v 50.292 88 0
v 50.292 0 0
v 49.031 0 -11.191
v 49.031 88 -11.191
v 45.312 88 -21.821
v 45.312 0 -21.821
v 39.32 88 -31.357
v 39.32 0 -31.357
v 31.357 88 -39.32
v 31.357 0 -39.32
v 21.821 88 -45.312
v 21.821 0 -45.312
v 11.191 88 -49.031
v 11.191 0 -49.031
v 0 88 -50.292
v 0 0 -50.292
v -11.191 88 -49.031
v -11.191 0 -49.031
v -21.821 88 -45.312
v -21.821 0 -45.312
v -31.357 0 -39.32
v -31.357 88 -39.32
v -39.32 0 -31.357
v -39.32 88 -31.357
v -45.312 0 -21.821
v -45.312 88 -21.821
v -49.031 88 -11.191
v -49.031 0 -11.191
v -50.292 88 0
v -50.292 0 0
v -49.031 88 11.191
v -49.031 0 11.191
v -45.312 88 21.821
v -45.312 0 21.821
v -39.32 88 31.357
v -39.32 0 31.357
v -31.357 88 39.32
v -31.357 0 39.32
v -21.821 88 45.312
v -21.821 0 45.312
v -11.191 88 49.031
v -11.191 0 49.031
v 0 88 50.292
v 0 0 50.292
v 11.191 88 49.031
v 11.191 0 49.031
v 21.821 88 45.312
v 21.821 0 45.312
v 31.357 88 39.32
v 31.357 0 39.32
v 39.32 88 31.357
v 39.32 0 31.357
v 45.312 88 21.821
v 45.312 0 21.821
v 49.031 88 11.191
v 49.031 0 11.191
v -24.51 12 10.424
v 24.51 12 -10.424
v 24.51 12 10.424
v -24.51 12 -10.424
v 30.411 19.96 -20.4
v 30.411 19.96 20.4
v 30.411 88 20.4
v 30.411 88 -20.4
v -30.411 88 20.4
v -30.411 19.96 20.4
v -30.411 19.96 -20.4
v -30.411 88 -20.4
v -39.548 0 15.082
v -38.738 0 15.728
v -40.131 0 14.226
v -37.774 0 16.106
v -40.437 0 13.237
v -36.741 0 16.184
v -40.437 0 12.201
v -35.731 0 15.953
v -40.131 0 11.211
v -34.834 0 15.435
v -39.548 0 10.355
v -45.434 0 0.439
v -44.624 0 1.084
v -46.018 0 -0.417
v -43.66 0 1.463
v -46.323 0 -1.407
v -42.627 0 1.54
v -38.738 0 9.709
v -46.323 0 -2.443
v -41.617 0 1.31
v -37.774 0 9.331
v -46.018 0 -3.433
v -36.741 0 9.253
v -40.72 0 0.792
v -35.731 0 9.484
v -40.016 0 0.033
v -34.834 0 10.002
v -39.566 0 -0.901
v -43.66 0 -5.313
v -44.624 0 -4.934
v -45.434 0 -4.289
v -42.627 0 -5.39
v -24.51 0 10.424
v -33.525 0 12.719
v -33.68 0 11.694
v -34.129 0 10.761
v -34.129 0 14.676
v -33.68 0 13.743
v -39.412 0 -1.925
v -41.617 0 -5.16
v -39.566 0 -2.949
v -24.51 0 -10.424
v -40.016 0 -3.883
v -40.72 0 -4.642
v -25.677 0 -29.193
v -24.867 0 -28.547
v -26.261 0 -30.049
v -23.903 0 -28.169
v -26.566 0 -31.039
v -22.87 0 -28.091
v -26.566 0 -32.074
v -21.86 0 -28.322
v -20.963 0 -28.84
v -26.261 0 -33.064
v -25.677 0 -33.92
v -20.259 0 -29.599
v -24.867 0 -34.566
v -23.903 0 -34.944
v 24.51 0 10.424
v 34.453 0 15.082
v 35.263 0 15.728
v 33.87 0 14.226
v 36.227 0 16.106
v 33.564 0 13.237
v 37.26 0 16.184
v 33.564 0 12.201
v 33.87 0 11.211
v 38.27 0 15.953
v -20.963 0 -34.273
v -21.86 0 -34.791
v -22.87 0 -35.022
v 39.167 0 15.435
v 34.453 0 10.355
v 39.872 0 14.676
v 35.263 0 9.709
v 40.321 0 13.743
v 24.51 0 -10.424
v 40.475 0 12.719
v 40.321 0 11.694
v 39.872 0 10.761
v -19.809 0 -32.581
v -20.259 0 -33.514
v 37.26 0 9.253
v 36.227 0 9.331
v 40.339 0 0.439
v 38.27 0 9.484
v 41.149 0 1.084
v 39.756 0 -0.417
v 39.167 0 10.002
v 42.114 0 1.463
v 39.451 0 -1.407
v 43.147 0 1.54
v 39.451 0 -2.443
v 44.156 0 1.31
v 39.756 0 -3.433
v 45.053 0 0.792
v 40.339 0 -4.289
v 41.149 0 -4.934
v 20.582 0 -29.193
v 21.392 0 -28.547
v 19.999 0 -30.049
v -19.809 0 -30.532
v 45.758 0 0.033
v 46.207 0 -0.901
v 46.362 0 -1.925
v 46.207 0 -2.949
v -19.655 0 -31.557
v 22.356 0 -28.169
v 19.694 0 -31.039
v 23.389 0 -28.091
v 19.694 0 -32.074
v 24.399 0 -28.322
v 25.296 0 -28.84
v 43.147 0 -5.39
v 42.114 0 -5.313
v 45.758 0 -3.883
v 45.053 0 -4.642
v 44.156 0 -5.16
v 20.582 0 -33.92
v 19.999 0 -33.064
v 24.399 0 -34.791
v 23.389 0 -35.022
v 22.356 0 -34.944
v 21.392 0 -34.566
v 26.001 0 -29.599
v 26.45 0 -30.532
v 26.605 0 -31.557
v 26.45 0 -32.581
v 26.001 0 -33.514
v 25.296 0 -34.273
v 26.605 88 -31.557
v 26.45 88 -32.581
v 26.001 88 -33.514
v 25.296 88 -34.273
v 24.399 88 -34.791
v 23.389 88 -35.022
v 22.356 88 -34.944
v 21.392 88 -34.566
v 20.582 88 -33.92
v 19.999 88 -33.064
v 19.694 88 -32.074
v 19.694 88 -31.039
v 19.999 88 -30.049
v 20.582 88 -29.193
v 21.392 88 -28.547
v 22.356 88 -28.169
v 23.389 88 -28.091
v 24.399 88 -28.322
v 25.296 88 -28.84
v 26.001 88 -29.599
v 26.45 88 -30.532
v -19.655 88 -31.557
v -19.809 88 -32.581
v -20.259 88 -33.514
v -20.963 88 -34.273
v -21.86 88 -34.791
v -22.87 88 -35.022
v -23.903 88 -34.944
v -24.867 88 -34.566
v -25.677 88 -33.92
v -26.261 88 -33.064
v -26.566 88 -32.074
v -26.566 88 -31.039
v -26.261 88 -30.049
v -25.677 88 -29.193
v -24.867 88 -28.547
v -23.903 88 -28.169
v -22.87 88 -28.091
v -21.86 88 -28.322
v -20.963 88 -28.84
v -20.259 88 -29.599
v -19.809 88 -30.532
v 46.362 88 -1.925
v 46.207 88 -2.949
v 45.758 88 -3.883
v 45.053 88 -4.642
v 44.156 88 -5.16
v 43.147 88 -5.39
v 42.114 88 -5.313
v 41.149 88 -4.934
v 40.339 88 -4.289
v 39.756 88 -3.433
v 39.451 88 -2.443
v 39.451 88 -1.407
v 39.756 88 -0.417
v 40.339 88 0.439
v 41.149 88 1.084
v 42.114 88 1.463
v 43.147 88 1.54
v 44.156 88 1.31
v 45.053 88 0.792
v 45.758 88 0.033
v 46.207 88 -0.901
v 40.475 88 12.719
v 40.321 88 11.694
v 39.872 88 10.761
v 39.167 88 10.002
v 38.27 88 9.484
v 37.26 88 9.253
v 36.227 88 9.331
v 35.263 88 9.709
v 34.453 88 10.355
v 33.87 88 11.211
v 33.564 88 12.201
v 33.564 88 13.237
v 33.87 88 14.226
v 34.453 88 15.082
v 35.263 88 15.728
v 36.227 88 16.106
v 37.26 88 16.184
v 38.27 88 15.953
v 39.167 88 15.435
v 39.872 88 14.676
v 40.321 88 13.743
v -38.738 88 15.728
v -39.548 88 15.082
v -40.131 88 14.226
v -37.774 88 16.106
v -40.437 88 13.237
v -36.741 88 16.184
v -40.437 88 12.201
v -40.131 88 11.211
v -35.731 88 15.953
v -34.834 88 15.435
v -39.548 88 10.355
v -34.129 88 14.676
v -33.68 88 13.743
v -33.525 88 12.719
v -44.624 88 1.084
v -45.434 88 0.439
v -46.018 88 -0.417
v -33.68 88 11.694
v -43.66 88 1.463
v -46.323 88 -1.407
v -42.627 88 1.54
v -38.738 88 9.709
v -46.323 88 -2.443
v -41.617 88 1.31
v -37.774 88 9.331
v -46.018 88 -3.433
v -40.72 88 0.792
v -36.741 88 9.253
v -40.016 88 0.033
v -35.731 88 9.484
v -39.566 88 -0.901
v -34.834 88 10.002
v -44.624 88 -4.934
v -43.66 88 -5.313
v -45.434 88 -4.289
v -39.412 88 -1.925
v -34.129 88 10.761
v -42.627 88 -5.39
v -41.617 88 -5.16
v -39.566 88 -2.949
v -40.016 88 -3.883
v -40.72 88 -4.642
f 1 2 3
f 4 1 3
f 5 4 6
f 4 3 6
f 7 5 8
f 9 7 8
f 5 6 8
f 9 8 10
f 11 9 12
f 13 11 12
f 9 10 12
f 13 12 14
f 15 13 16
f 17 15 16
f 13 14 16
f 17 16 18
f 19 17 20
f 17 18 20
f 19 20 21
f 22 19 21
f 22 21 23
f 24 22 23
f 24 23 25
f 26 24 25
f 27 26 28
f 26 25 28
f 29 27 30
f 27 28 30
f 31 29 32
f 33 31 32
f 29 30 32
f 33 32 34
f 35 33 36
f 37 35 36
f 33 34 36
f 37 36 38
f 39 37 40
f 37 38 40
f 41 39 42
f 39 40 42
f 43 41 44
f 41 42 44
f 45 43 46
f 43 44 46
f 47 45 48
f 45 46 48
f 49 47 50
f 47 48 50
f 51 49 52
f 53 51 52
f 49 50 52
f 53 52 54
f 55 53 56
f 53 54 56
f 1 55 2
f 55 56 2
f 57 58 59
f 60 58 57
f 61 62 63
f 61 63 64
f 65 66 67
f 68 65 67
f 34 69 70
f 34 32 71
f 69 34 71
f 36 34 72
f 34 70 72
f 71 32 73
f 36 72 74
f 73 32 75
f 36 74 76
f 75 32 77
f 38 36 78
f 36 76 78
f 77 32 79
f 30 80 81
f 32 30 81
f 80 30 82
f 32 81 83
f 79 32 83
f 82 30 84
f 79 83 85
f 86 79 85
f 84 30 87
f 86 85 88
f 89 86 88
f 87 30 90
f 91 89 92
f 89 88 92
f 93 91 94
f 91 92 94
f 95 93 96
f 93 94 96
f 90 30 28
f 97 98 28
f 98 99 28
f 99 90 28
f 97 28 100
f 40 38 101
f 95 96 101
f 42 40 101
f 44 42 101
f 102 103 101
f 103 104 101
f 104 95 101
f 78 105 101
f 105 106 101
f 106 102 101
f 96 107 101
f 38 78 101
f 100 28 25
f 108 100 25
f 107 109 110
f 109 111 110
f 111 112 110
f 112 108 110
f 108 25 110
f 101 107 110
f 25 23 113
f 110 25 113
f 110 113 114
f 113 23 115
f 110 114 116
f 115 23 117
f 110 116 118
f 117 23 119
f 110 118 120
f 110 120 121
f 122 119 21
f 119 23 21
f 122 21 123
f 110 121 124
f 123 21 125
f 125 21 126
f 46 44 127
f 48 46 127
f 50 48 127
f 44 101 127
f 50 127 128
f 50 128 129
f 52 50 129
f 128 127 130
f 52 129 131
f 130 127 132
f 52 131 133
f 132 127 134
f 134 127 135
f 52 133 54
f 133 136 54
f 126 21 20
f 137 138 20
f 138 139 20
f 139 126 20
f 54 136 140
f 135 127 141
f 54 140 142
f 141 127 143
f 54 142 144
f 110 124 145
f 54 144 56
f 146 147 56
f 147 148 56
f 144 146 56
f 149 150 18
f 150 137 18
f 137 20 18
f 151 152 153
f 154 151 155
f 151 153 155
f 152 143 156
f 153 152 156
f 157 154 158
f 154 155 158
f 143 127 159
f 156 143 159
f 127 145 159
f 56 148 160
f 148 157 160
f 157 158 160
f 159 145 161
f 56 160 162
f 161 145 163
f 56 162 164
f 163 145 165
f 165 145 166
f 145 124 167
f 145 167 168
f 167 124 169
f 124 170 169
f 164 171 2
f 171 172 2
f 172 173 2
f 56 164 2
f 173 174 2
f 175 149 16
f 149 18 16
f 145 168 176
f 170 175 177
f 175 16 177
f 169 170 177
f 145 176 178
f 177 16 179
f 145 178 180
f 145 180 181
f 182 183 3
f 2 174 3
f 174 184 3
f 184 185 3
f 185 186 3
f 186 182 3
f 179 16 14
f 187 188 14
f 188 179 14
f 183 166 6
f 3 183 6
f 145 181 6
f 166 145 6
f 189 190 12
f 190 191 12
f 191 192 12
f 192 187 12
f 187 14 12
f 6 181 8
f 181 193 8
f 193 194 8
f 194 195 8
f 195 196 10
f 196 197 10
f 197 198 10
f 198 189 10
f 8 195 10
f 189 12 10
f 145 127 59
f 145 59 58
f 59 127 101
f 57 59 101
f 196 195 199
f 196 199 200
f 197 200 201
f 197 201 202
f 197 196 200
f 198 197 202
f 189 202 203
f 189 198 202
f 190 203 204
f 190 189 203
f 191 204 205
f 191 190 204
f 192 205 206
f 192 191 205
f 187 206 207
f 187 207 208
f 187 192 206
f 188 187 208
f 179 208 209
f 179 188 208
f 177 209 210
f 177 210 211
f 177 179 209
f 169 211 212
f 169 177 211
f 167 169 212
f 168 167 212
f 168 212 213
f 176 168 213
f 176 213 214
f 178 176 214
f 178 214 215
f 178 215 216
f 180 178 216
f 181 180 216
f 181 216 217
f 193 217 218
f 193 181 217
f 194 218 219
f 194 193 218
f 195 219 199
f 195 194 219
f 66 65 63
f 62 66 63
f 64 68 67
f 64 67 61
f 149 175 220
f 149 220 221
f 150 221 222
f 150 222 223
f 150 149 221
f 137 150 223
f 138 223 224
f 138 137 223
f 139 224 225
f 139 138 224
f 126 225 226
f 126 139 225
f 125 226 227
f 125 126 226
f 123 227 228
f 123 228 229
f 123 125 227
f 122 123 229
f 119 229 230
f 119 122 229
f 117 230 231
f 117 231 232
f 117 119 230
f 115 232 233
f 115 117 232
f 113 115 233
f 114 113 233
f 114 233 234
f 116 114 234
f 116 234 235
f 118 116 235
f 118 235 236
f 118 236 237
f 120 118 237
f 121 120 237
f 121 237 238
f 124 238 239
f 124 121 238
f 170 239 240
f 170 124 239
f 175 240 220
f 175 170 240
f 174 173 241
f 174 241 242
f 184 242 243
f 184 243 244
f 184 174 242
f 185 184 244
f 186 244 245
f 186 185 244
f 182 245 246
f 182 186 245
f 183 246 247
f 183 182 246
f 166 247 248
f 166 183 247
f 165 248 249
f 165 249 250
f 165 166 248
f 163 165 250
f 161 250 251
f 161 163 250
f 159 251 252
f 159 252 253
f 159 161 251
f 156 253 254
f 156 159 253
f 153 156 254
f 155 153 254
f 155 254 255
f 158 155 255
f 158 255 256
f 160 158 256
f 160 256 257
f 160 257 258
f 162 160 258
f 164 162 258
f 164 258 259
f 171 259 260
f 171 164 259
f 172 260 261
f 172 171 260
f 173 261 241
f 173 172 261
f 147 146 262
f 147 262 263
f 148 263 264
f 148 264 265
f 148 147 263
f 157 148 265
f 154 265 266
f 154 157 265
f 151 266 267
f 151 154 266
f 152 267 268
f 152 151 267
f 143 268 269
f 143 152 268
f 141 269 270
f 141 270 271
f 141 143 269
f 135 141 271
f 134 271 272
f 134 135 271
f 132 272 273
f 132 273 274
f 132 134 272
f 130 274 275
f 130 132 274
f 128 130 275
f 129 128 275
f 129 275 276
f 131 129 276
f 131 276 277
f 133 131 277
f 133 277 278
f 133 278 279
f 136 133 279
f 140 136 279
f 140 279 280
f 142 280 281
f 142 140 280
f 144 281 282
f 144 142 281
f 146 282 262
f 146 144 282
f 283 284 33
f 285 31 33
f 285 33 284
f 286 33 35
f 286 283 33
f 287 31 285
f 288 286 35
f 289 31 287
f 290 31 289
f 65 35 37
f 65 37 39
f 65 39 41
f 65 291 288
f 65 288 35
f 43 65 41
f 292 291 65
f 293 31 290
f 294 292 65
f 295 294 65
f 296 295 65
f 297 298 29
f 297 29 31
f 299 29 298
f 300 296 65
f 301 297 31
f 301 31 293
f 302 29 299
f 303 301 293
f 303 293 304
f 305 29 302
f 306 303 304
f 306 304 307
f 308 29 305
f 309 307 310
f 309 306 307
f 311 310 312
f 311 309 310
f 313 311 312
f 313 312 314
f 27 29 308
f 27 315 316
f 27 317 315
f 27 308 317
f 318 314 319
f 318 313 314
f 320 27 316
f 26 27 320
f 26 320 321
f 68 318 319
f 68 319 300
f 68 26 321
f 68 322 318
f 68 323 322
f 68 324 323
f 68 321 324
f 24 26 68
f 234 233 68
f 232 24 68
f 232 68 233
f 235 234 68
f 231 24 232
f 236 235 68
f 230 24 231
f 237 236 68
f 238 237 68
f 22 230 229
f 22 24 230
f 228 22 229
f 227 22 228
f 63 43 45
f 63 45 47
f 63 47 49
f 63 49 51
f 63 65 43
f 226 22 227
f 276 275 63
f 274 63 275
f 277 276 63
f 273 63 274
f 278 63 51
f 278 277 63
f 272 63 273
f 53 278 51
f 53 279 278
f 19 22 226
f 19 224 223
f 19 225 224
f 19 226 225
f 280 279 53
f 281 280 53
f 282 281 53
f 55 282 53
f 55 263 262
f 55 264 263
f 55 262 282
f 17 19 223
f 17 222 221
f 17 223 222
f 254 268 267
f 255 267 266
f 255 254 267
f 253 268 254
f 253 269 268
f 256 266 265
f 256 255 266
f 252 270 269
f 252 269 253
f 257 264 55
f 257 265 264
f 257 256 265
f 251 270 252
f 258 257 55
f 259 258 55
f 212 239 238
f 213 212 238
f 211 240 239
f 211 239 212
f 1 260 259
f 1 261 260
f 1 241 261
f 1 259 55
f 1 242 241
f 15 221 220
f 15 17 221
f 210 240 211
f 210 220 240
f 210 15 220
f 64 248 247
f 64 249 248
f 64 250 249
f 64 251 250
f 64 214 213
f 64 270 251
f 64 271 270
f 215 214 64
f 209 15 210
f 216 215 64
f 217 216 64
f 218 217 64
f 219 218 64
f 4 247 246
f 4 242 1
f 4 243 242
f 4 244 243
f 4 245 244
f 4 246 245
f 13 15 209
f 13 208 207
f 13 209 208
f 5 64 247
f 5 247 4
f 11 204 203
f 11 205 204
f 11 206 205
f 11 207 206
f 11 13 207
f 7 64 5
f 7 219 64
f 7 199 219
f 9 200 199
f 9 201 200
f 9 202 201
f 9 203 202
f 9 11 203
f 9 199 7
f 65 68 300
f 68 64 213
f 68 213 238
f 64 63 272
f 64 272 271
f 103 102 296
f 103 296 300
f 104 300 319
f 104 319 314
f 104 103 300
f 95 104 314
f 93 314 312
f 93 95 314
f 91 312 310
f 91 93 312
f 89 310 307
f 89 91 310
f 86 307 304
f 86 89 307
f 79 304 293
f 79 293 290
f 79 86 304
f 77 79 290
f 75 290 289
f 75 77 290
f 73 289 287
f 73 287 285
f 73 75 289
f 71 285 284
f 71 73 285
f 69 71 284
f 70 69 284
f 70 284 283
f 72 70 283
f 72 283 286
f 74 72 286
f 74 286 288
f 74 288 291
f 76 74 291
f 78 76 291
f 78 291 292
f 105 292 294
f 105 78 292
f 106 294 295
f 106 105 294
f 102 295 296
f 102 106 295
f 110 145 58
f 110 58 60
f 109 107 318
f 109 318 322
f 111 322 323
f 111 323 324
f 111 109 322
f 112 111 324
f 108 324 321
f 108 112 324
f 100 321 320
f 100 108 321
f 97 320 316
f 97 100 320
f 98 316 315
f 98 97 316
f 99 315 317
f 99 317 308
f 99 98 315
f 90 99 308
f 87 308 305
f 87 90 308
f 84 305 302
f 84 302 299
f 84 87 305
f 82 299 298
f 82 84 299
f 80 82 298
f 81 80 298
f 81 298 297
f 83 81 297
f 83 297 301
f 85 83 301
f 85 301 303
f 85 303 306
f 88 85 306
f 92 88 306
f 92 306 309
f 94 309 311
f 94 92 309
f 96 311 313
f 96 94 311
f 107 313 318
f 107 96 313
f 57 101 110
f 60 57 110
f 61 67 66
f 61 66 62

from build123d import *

# Parameters (mm, degrees)
SKETCH1_R           = 50.292
SKETCH1_R_2         = 3.475
BOSS_EXTRUDE1_DEPTH = 88
SKETCH2_W           = 60.822109288
SKETCH2_H           = 40.800022246
CUT_EXTRUDE1_DEPTH  = 68.04
SKETCH3_W           = 49.01906667
SKETCH3_H           = 20.847628368
CUT_EXTRUDE2_DEPTH  = 12


with BuildPart() as part:
    # Sketch1 → Boss-Extrude1 (new body)
    with BuildSketch(Plane(origin=(0, 0, 0), x_dir=(1, 0, 0), z_dir=(0, 1, 0))):
        Circle(SKETCH1_R)
        with Locations((42.886820356, 1.924977859)):
            Circle(SKETCH1_R_2, mode=Mode.SUBTRACT)
        with Locations((-42.886820356, 1.924977859)):
            Circle(SKETCH1_R_2, mode=Mode.SUBTRACT)
        with Locations((-37.000474826, -12.718618748)):
            Circle(SKETCH1_R_2, mode=Mode.SUBTRACT)
        with Locations((-23.129730363, 31.556520301)):
            Circle(SKETCH1_R_2, mode=Mode.SUBTRACT)
        with Locations((37.000474826, -12.718618748)):
            Circle(SKETCH1_R_2, mode=Mode.SUBTRACT)
        with Locations((23.129730363, 31.556520301)):
            Circle(SKETCH1_R_2, mode=Mode.SUBTRACT)
    extrude(amount=BOSS_EXTRUDE1_DEPTH)

    # Sketch2 → Cut-Extrude1 (cut)
    with BuildSketch(Plane(origin=(0, 88, 0), x_dir=(1, 0, 0), z_dir=(0, 1, 0))):
        Rectangle(SKETCH2_W, SKETCH2_H)
    extrude(amount=-CUT_EXTRUDE1_DEPTH, mode=Mode.SUBTRACT)

    # Sketch3 → Cut-Extrude2 (cut)
    with BuildSketch(Plane(origin=(0, 0, 0), x_dir=(-1, 0, 0), z_dir=(0, -1, 0))):
        Rectangle(SKETCH3_W, SKETCH3_H)
    extrude(amount=-CUT_EXTRUDE2_DEPTH, mode=Mode.SUBTRACT)


solid = part.part
